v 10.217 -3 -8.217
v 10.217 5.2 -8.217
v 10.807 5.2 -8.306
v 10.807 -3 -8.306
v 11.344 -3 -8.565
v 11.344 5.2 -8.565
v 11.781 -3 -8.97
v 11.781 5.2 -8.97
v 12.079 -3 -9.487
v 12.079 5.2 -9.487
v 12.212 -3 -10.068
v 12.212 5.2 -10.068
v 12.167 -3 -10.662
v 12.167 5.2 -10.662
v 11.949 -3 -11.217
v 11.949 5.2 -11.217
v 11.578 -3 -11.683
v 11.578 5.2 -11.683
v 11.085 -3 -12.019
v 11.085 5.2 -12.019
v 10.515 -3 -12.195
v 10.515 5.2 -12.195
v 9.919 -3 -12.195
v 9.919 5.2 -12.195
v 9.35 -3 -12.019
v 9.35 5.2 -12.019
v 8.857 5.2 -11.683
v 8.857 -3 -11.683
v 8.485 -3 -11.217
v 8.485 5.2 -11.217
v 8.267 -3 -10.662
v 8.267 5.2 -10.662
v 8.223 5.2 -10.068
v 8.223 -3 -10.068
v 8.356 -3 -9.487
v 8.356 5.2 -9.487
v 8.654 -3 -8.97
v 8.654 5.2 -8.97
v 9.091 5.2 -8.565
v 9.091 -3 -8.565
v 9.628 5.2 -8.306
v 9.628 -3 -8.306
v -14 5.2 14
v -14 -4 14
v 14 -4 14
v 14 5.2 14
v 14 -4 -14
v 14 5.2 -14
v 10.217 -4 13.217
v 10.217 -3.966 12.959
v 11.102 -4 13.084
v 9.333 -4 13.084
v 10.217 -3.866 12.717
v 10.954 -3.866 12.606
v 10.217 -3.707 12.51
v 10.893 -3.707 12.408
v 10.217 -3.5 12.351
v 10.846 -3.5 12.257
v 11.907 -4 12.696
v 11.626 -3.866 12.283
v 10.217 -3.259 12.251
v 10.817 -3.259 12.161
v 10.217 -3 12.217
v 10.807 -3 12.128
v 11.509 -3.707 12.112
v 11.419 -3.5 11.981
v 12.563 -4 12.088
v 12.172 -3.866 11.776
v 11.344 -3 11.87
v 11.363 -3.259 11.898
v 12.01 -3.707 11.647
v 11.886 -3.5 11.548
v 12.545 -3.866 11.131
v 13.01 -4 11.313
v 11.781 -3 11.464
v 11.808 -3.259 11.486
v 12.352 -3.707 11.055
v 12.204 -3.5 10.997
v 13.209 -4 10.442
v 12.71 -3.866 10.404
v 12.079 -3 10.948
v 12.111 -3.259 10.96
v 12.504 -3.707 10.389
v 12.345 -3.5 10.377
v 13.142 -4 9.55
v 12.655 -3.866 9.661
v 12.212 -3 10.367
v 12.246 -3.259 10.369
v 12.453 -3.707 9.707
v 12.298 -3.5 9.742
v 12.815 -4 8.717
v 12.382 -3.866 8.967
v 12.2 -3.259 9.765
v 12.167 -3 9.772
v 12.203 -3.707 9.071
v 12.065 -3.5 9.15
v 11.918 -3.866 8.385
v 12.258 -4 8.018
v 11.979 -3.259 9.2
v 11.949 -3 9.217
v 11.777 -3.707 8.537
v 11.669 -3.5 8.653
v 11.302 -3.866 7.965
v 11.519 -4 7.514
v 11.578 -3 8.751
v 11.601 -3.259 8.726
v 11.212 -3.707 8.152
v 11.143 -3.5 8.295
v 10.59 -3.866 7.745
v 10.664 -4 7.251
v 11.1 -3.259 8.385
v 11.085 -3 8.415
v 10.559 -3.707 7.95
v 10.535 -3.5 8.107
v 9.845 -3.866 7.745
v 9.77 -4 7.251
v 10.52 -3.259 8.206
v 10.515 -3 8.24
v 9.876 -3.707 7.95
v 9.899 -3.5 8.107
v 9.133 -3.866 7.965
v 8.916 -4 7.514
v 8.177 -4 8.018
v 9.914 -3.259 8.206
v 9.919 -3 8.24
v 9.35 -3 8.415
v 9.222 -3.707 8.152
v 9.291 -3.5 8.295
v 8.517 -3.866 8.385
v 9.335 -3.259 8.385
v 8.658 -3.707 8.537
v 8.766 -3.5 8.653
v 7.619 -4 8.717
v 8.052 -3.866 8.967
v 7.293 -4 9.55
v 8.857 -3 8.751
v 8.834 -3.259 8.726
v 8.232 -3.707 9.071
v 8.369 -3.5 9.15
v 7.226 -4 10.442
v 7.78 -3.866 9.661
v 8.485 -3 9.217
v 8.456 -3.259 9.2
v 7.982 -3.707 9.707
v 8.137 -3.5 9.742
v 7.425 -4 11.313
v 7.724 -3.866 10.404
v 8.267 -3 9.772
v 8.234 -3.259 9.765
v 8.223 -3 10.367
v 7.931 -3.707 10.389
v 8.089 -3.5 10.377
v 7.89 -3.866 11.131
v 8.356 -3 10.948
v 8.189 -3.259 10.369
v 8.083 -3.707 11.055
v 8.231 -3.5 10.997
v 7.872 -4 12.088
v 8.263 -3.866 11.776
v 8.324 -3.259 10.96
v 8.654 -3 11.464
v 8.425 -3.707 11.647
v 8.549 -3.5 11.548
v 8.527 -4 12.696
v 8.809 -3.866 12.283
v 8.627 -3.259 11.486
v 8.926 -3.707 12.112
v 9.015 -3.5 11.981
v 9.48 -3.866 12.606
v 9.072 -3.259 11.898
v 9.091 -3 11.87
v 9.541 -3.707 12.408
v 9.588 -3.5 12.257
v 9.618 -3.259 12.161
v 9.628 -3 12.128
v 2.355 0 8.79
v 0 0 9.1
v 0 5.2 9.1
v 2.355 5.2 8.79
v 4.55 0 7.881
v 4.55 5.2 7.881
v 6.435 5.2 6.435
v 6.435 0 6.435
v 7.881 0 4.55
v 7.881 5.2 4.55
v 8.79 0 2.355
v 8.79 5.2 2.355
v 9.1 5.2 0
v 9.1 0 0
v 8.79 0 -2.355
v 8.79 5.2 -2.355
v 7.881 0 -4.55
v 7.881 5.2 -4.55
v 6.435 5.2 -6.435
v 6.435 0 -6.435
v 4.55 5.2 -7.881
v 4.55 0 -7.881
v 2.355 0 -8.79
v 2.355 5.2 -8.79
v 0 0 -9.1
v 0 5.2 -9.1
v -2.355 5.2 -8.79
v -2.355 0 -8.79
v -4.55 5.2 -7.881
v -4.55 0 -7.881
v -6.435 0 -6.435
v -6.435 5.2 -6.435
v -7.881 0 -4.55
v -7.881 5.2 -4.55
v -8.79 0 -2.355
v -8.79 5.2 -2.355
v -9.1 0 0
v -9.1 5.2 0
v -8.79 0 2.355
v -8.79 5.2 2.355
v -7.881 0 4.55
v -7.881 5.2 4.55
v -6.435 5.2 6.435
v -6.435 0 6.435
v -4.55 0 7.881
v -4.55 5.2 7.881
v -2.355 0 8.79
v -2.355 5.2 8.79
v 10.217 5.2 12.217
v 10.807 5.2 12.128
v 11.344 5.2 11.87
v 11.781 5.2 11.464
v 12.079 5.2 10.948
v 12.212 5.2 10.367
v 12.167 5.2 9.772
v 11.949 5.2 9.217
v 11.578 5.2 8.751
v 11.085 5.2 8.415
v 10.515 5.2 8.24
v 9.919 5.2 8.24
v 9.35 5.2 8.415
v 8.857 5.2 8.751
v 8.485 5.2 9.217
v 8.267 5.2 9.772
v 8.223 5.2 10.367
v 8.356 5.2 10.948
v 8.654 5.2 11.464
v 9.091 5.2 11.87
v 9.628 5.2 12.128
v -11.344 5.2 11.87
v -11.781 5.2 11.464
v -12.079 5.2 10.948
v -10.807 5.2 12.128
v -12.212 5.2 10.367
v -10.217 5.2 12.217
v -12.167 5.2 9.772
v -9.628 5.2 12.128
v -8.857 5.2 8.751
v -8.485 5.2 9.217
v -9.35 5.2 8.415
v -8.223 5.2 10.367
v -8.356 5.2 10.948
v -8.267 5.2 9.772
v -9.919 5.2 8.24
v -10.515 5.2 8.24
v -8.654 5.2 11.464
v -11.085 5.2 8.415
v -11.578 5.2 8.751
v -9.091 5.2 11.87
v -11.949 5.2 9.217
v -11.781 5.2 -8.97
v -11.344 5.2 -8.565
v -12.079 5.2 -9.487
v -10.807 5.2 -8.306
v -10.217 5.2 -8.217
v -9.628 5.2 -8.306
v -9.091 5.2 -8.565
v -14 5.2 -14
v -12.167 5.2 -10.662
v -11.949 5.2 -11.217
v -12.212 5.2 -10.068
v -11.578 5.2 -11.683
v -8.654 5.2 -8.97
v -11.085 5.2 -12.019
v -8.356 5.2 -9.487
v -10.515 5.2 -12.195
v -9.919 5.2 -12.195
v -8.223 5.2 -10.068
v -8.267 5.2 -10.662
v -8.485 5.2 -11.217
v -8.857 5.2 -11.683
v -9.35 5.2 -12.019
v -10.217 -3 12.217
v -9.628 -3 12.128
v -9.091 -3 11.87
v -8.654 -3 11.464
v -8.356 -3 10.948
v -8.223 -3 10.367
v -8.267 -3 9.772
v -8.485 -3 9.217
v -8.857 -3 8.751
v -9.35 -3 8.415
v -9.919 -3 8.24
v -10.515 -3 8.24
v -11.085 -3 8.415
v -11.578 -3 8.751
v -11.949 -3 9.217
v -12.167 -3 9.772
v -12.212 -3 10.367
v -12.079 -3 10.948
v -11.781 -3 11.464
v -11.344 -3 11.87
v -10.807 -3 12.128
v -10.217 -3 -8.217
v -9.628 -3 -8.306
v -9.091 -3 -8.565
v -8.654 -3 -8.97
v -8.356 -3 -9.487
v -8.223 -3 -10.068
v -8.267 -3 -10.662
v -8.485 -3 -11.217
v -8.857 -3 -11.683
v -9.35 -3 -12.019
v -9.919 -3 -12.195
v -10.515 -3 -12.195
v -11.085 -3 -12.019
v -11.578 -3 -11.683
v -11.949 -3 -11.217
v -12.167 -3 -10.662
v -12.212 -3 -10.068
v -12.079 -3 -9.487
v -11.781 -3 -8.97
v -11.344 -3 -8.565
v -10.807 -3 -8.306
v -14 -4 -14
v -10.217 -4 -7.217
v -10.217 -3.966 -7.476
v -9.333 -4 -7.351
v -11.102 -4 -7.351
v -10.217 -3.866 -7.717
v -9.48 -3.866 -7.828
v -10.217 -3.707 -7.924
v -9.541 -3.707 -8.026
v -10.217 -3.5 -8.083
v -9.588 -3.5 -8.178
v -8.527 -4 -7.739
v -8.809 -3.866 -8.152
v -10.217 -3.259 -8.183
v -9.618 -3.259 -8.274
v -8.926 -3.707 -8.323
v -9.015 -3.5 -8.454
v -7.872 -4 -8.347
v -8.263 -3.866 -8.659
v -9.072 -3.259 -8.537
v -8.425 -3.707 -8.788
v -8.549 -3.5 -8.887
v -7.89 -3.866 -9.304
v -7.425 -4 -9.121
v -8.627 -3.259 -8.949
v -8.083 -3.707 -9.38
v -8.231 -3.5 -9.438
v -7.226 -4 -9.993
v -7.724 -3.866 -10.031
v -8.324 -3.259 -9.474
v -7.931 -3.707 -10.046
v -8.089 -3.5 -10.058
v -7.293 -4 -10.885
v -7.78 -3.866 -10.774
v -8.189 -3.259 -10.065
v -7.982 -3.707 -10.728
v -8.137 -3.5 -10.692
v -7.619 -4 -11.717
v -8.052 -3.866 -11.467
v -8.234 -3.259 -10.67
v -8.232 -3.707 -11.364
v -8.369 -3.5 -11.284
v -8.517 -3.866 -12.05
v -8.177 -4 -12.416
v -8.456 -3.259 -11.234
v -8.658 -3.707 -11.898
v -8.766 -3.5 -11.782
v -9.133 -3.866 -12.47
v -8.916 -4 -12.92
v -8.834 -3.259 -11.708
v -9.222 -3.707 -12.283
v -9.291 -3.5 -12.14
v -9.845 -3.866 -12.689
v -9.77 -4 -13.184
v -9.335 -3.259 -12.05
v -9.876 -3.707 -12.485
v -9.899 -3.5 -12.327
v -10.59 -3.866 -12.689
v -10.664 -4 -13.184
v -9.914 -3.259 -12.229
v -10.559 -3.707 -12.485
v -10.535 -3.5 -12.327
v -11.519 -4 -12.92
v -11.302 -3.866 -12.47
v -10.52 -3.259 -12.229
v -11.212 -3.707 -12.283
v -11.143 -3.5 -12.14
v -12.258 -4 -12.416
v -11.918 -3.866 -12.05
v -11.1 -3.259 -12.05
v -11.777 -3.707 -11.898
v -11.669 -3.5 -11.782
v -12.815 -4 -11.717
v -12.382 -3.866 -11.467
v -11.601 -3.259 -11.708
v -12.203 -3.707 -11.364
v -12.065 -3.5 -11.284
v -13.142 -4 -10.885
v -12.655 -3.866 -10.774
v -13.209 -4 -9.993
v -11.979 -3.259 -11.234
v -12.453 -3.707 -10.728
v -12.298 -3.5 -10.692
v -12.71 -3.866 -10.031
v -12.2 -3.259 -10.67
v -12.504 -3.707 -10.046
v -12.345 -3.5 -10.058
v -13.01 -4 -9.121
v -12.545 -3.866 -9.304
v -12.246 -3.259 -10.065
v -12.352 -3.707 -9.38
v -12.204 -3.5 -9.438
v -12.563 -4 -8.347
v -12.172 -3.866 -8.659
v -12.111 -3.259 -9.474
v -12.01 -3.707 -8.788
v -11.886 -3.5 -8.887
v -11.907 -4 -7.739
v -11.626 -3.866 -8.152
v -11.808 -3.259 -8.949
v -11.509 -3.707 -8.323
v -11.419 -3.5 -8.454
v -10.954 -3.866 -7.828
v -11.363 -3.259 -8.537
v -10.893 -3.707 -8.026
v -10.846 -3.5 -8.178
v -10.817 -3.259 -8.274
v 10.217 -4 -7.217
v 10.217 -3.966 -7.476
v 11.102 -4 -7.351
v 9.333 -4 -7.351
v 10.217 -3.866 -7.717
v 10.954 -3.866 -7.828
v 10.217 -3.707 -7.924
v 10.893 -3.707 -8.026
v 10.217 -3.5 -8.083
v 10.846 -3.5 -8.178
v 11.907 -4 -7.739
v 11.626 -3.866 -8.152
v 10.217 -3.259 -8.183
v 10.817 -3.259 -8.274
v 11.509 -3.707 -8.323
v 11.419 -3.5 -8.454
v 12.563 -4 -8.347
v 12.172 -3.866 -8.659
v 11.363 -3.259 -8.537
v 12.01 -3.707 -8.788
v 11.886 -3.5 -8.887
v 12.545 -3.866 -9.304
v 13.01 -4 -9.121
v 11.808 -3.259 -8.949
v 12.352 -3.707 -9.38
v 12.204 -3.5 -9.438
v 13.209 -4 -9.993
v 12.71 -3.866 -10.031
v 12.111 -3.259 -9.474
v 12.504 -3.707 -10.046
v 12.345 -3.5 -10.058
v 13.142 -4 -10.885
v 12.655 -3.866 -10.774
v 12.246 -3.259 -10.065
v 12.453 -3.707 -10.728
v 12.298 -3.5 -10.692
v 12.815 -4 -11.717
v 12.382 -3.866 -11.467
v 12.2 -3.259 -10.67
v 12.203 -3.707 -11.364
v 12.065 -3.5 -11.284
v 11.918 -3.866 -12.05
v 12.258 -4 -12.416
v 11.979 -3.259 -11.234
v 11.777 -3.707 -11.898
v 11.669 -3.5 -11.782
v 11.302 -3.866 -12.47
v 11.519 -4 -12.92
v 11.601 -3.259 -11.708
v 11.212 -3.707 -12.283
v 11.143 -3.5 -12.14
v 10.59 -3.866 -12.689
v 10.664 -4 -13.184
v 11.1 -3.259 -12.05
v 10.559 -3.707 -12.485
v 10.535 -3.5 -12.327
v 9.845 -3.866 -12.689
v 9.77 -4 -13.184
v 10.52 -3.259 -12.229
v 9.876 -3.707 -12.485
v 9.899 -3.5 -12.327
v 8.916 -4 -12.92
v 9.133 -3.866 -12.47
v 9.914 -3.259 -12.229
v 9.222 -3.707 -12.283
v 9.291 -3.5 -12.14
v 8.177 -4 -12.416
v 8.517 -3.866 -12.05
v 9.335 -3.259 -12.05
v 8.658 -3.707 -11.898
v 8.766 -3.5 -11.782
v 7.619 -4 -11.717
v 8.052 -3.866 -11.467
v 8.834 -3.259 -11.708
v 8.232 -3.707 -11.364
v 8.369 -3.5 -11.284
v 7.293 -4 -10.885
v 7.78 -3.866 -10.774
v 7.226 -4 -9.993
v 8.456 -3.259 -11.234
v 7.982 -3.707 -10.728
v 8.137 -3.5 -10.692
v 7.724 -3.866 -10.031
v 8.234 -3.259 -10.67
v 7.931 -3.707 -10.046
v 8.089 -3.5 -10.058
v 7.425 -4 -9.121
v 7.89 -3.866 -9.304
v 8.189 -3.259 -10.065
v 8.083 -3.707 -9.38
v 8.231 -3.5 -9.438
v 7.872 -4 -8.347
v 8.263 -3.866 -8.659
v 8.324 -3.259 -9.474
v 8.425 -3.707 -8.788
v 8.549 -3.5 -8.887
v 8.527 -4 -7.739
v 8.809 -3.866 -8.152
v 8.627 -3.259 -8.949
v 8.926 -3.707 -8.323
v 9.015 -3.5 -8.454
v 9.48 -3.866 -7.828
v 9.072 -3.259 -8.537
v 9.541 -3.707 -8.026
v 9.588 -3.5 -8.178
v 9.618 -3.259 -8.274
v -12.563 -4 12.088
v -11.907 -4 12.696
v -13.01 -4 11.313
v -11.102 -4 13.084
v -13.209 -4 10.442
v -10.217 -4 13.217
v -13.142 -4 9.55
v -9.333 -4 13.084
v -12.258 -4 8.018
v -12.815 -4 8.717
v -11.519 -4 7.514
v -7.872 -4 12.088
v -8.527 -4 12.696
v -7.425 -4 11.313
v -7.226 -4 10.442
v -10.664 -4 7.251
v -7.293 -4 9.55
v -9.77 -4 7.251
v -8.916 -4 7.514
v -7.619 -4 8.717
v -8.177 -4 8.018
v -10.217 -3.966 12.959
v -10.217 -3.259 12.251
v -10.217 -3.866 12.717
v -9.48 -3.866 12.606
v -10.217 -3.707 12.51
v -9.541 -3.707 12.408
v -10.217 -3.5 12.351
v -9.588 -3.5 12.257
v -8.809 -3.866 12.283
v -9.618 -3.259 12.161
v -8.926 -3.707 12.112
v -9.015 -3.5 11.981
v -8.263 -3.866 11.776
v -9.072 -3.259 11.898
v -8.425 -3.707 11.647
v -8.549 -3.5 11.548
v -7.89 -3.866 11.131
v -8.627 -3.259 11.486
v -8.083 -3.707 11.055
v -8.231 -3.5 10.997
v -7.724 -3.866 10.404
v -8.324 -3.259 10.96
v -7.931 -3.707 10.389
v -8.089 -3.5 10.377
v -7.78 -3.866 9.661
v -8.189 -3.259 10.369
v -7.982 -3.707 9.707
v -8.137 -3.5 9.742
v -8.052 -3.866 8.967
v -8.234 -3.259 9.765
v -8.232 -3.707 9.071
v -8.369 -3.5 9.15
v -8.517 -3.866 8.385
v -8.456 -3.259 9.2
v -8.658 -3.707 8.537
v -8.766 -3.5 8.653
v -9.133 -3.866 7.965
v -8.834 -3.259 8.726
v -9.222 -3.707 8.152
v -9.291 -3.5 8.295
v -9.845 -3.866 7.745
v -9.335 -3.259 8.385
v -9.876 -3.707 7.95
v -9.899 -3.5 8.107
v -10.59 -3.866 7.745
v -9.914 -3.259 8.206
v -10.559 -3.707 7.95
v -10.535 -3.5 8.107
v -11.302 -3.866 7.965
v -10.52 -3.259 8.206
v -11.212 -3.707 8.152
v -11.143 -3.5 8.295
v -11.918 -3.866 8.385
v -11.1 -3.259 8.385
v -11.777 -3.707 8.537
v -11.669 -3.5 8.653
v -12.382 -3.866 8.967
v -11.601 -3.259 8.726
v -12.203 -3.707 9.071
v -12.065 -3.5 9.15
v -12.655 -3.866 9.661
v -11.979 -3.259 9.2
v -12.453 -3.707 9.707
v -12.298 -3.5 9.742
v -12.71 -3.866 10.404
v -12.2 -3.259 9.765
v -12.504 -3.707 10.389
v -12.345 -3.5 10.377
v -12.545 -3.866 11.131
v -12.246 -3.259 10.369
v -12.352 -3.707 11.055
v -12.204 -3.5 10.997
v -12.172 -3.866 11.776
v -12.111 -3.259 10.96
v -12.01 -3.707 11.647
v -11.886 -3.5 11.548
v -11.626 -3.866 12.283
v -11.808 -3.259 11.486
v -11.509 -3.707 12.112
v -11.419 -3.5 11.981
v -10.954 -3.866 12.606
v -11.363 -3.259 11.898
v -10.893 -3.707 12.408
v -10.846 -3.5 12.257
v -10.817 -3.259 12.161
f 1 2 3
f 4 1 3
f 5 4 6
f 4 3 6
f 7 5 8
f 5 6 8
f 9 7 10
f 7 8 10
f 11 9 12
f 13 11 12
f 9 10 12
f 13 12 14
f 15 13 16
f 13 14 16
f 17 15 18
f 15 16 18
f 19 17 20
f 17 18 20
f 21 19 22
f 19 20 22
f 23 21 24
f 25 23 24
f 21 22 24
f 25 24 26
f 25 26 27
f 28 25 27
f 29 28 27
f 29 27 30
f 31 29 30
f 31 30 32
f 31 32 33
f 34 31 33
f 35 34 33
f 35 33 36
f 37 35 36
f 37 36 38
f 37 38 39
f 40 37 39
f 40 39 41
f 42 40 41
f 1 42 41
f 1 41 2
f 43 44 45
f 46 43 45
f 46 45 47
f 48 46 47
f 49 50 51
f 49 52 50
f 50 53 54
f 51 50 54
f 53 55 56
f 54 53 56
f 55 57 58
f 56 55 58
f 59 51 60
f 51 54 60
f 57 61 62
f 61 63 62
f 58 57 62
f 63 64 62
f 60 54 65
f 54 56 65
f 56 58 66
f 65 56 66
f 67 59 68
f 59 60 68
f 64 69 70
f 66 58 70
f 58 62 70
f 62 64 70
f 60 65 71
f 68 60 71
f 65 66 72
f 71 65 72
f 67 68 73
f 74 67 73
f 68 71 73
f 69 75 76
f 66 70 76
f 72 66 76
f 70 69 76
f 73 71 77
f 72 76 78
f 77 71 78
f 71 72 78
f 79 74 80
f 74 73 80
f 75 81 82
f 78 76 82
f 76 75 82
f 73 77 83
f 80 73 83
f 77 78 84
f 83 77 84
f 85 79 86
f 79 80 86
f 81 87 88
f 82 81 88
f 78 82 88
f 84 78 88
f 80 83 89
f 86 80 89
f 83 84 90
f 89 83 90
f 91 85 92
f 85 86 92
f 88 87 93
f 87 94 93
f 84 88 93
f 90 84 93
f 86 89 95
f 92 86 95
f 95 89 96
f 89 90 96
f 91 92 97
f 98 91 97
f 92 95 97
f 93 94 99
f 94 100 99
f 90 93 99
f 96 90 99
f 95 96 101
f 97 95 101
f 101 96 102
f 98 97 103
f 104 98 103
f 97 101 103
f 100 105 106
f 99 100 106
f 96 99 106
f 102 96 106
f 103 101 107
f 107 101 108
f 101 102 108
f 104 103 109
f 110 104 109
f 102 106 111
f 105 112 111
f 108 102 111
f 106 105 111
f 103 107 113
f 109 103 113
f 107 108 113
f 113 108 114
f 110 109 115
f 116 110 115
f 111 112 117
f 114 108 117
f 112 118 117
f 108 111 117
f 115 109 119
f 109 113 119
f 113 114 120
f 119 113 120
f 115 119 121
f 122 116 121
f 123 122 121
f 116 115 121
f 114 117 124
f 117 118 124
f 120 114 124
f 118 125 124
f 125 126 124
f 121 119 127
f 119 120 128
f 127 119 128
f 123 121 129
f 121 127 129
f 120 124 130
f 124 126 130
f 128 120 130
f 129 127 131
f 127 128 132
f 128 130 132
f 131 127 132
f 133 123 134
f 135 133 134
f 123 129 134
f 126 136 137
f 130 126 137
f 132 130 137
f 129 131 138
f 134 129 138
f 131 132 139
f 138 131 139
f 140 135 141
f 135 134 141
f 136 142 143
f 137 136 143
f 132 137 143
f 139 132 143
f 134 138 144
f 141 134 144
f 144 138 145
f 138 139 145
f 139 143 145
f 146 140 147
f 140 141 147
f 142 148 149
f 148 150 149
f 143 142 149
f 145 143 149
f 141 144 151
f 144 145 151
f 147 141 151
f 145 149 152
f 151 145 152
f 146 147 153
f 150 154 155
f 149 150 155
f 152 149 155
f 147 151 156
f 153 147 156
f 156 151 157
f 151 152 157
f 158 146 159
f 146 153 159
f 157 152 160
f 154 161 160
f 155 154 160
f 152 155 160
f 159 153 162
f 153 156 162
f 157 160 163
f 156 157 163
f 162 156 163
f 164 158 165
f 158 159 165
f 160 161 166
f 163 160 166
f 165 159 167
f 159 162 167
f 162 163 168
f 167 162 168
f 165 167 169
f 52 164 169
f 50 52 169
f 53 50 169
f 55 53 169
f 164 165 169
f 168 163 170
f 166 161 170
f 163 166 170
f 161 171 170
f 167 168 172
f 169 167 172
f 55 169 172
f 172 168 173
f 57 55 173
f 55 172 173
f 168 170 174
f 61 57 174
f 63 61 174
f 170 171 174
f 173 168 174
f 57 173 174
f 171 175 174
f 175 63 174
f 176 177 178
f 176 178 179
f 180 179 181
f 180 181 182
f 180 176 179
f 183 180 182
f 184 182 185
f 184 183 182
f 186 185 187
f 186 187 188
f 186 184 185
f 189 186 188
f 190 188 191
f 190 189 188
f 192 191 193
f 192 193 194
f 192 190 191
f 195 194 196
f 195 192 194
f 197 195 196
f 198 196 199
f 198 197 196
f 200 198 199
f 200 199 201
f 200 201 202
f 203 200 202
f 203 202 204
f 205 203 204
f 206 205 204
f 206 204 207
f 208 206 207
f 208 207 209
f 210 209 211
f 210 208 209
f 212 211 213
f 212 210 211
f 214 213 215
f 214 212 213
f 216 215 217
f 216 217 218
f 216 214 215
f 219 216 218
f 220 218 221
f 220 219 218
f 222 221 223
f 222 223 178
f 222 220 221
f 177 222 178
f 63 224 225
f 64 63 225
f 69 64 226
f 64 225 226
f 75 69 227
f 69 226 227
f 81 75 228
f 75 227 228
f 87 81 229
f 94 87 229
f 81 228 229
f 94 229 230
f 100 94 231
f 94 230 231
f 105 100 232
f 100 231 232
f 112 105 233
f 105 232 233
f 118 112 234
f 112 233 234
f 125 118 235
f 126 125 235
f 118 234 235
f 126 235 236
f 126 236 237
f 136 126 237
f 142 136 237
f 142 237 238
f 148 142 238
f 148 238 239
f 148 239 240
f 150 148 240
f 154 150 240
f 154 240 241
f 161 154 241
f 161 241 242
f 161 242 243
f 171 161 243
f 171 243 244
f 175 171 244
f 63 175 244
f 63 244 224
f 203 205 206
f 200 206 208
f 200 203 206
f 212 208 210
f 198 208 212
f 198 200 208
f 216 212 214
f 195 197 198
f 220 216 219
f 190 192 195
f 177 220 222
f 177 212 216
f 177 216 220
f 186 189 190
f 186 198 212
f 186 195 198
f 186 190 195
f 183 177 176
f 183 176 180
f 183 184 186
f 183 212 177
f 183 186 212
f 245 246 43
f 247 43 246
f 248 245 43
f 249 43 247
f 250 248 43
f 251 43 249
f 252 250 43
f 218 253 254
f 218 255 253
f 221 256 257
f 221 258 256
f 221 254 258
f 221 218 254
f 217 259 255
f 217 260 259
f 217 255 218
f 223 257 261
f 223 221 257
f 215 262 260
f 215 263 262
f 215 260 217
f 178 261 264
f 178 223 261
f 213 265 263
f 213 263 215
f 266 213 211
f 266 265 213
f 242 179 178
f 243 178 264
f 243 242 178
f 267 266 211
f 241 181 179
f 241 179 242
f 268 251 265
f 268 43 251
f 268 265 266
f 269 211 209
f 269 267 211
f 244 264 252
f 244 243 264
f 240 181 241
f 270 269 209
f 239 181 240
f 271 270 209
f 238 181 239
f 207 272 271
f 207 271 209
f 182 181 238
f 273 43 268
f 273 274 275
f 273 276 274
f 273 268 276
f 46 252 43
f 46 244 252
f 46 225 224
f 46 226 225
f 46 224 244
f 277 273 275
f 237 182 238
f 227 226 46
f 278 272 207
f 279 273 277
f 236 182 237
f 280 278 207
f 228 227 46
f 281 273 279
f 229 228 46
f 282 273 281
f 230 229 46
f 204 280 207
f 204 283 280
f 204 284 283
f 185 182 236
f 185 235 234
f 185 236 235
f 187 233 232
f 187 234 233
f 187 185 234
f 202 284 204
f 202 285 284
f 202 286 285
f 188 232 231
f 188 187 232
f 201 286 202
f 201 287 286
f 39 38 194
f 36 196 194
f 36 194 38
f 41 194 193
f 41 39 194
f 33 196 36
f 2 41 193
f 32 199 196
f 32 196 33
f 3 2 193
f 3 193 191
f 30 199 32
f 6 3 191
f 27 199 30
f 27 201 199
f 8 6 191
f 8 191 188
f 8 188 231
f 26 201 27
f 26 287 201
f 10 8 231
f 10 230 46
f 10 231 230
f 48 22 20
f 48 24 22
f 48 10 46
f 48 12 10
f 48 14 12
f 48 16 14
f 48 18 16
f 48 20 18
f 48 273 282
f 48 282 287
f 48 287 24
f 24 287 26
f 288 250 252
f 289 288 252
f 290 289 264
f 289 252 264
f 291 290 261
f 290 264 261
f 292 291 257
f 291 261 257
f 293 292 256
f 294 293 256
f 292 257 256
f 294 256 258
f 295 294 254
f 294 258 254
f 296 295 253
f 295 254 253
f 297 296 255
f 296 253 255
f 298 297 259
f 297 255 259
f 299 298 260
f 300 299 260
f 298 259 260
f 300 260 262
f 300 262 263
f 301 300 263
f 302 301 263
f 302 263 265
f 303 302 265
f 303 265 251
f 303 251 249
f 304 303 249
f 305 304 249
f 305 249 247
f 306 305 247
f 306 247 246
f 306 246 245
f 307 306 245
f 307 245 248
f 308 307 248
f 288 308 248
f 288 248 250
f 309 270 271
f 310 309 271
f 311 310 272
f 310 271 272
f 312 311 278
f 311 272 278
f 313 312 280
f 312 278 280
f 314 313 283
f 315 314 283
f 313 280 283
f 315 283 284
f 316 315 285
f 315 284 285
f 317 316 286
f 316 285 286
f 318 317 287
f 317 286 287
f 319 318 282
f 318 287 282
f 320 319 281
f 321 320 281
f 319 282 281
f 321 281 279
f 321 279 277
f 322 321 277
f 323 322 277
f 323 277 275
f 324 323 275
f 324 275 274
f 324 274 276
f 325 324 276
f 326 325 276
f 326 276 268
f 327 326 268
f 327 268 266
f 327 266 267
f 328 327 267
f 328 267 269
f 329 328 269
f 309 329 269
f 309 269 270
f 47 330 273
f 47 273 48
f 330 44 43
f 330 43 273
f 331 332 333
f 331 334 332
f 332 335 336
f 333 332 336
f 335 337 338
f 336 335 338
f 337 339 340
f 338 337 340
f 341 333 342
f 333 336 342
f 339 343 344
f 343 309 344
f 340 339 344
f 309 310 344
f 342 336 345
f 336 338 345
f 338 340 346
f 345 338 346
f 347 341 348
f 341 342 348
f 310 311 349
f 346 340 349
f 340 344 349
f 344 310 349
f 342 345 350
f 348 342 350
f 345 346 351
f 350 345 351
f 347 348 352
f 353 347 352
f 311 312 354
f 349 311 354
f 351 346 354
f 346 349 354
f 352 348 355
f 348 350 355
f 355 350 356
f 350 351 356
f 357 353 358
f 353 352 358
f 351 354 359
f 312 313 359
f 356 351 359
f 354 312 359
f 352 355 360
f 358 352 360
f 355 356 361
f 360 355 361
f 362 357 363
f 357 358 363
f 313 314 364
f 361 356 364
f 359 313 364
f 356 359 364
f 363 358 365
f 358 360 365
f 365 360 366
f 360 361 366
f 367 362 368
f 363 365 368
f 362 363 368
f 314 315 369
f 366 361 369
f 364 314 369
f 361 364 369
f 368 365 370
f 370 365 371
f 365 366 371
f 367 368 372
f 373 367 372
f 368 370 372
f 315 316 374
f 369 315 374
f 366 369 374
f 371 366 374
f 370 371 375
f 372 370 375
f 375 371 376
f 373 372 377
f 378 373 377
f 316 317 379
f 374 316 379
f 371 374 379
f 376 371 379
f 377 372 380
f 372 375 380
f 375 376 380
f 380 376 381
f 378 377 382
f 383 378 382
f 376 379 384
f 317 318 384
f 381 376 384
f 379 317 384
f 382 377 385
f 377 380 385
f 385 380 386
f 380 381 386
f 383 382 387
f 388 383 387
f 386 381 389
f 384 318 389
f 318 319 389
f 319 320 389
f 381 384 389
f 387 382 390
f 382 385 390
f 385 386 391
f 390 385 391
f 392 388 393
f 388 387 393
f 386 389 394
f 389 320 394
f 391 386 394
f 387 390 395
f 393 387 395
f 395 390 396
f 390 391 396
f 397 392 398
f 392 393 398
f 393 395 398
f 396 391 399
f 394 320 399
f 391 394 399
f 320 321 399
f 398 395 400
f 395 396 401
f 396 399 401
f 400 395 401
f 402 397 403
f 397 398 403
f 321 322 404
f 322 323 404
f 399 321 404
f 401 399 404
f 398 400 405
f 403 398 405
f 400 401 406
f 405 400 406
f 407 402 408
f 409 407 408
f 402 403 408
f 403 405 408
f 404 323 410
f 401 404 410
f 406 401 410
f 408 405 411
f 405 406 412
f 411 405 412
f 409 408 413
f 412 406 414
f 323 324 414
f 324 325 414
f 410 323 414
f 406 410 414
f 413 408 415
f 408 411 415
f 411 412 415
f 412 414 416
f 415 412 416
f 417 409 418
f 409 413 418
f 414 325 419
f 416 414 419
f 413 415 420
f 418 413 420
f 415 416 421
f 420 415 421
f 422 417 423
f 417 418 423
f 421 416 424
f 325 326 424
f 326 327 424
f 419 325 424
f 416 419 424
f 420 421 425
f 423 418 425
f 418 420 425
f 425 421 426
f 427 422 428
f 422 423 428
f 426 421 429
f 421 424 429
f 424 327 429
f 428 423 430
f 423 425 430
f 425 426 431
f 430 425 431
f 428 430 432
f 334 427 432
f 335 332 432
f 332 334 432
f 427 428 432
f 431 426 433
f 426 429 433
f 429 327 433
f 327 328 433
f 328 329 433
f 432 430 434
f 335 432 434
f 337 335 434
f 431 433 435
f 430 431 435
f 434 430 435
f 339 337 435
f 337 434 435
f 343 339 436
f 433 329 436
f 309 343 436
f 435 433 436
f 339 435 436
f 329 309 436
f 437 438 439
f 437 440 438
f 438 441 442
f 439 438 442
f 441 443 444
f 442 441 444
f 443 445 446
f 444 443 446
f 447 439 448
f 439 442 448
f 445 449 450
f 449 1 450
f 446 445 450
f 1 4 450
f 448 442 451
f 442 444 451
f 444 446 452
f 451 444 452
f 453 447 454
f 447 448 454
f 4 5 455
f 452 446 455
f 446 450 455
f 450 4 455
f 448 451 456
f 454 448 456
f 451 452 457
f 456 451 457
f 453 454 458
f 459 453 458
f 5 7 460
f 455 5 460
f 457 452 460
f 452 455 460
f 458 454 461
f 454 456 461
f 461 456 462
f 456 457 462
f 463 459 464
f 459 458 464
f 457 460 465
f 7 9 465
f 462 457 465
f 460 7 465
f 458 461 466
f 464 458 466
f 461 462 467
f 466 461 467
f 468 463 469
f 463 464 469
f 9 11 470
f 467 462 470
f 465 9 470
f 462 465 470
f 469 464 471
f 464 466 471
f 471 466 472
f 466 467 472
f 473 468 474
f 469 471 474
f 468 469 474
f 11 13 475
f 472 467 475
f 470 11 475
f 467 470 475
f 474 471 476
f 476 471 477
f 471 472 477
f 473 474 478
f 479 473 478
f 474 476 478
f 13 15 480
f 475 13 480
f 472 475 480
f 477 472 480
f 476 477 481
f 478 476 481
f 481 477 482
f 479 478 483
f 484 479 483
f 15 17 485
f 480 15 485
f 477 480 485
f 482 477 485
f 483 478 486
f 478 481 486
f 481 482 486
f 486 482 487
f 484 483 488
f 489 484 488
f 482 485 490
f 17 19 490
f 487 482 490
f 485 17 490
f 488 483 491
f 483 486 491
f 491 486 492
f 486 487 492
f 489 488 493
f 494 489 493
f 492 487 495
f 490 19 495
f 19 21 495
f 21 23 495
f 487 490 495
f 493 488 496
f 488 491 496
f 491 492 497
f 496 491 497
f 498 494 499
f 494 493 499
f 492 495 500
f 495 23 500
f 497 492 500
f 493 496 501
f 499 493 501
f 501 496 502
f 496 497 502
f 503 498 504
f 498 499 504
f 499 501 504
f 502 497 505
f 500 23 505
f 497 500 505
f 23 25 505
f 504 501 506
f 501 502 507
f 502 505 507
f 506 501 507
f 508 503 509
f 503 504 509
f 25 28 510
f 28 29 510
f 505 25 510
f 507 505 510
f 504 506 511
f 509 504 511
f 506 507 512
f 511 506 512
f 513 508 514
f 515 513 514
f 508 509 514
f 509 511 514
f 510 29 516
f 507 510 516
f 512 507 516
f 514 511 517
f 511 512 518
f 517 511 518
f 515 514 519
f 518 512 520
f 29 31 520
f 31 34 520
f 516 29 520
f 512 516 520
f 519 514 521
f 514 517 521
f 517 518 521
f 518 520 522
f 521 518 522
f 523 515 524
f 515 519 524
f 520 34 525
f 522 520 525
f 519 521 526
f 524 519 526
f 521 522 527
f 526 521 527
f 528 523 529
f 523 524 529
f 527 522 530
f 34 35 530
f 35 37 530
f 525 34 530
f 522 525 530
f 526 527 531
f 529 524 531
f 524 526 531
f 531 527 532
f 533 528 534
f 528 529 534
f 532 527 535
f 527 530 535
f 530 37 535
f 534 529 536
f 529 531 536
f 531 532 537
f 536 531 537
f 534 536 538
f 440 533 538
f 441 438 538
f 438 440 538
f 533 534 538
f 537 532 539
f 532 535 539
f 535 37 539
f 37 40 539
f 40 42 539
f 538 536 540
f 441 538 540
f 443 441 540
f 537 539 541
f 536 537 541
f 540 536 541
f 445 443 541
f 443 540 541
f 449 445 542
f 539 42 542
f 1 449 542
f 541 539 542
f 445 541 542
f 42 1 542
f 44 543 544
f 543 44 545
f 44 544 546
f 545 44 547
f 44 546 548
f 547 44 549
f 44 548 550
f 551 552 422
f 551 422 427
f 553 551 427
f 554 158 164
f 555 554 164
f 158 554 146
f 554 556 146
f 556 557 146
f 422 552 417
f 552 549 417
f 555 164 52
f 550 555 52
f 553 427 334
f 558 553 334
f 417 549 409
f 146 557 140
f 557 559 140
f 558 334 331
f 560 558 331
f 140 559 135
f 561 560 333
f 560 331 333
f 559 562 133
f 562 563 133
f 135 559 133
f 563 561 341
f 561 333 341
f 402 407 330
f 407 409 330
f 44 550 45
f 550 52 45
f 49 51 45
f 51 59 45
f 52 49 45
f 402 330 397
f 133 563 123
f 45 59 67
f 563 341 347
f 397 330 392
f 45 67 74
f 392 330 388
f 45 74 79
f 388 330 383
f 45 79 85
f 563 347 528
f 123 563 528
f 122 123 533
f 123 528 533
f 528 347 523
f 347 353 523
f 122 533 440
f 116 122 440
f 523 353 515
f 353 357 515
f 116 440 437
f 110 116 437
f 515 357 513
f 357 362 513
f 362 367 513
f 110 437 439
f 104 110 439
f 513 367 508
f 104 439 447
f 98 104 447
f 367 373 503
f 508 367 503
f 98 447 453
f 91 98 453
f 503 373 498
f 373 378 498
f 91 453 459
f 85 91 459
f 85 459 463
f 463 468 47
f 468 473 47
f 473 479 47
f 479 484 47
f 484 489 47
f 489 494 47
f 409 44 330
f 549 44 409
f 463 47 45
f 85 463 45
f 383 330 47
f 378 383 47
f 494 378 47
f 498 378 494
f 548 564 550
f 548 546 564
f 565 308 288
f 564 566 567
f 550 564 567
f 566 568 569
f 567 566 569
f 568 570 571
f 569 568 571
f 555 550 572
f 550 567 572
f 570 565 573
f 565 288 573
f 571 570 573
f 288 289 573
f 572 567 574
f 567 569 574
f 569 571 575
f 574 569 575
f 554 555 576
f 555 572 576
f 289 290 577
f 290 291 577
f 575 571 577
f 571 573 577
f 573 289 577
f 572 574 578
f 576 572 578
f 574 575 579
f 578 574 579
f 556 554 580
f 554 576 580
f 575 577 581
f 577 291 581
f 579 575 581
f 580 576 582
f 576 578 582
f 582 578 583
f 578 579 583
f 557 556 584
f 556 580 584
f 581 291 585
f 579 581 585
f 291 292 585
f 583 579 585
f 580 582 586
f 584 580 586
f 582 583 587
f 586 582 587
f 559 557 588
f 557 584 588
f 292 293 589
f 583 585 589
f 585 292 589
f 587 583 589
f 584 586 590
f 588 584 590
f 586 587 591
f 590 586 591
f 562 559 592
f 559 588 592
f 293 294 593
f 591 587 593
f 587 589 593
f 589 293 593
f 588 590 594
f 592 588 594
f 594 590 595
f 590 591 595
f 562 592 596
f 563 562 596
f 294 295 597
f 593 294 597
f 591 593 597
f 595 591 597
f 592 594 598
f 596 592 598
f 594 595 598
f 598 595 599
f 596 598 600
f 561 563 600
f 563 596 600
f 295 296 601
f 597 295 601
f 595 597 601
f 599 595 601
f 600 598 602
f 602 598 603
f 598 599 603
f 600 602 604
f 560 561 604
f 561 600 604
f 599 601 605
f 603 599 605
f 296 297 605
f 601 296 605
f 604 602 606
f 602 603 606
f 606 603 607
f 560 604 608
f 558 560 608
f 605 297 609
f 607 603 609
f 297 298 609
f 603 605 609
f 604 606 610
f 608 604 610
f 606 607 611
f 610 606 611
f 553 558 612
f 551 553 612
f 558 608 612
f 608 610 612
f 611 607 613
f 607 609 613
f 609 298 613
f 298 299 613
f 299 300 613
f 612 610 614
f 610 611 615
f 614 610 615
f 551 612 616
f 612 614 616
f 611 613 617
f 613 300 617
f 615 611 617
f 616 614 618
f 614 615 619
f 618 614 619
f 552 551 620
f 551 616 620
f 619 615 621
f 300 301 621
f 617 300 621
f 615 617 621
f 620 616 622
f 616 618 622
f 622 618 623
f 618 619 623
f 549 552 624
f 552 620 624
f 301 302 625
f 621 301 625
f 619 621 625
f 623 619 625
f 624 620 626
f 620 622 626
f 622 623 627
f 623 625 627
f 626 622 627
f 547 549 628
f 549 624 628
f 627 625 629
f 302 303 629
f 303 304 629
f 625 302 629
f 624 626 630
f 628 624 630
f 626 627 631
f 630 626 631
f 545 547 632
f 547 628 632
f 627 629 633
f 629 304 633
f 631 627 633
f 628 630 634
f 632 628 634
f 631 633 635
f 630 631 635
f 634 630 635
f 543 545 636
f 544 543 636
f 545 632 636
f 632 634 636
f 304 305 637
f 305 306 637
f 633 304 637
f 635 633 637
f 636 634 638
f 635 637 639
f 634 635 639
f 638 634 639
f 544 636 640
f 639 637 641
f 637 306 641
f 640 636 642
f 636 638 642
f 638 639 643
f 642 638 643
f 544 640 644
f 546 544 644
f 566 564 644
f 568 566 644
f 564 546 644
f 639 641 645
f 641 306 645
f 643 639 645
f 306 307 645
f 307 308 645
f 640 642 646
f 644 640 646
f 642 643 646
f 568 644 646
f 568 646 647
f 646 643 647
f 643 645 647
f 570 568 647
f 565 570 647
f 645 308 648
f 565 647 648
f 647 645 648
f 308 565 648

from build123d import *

# Parameters (mm, degrees)
SKETCH2_W           = 28
SKETCH2_H           = 28
SKETCH2_R           = 9.1
BOSS_EXTRUDE1_DEPTH = 5.2
SKETCH2_4_W         = 28
SKETCH2_4_H         = 28
BOSS_EXTRUDE2_DEPTH = 4
SKETCH3_R           = 2
CUT_EXTRUDE1_DEPTH  = 22.832086478
FILLET1_R           = 1


with BuildPart() as part:
    # Sketch2 → Boss-Extrude1 (new body)
    with BuildSketch(Plane(origin=(0, 0, 0), x_dir=(1, 0, 0), z_dir=(0, 1, 0))):
        Rectangle(SKETCH2_W, SKETCH2_H)
        Circle(SKETCH2_R, mode=Mode.SUBTRACT)
    extrude(amount=BOSS_EXTRUDE1_DEPTH)

    # Sketch2<4> → Boss-Extrude2 (add)
    with BuildSketch(Plane(origin=(0, 0, 0), x_dir=(1, 0, 0), z_dir=(0, 1, 0))):
        Rectangle(SKETCH2_4_W, SKETCH2_4_H)
    extrude(amount=-BOSS_EXTRUDE2_DEPTH)

    # Sketch3 → Cut-Extrude1 (cut, through all)
    with BuildSketch(Plane(origin=(0, 5.2, 0), x_dir=(1, 0, 0), z_dir=(0, 1, 0))):
        with Locations((-10.217335854, 10.217335854)):
            Circle(SKETCH3_R)
        with Locations((-10.217335854, -10.217335854)):
            Circle(SKETCH3_R)
        with Locations((10.217335854, -10.217335854)):
            Circle(SKETCH3_R)
        with Locations((10.217335854, 10.217335854)):
            Circle(SKETCH3_R)
    extrude(amount=-CUT_EXTRUDE1_DEPTH, mode=Mode.SUBTRACT)

    # Fillet1
    fillet1_edges = [part.edges().sort_by_distance(p)[0] for p in [
        (8.217335854, -4, 10.217335854),
        (8.217335854, -4, -10.217335854),
        (-12.217335854, -4, 10.217335854),
        (-12.217335854, -4, -10.217335854),
    ]]
    fillet(fillet1_edges, radius=FILLET1_R)


solid = part.part
